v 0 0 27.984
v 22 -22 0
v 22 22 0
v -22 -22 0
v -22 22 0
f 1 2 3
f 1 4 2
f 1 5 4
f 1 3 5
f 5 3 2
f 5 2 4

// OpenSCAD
// Pi derived from a whole number.
// for 999999 inspired by Shek Singhal
// implemented as a Pyramid
// see: http://vortexspace.org/display/theory/Phe+-+Universal+Curvature+Constant

Phe = 1 / sqrt((sqrt(5)+1)/2); // =~ 0.78615137775742(...)

//r = 220; // * actual unit for this object is a royal_cubit =~ 523 to 529 mm

// Radius
r = 22; // 0.22-222222  
h = r / Phe;

color ("PaleGoldenrod")
polyhedron(
  points=[ [r,r,0],[r,-r,0],[-r,-r,0],[-r,r,0], // the four points at base
//           [0,0,r]  ],                        // the apex point for Cheops
           [0,0,h]  ],                          // the apex point for half an octahedron
  triangles=[ [0,1,4],[1,2,4],[2,3,4],[3,0,4],  // each triangle side
              [1,0,3],[2,1,3] ]                 // two triangles for square base
);

// other stuff
// slant_height = r / Phe / Phe;
// CircleArea = (4*r) * (sqrt( 2) * Phe);
// CircleCircum = (8*r) * Phe;
